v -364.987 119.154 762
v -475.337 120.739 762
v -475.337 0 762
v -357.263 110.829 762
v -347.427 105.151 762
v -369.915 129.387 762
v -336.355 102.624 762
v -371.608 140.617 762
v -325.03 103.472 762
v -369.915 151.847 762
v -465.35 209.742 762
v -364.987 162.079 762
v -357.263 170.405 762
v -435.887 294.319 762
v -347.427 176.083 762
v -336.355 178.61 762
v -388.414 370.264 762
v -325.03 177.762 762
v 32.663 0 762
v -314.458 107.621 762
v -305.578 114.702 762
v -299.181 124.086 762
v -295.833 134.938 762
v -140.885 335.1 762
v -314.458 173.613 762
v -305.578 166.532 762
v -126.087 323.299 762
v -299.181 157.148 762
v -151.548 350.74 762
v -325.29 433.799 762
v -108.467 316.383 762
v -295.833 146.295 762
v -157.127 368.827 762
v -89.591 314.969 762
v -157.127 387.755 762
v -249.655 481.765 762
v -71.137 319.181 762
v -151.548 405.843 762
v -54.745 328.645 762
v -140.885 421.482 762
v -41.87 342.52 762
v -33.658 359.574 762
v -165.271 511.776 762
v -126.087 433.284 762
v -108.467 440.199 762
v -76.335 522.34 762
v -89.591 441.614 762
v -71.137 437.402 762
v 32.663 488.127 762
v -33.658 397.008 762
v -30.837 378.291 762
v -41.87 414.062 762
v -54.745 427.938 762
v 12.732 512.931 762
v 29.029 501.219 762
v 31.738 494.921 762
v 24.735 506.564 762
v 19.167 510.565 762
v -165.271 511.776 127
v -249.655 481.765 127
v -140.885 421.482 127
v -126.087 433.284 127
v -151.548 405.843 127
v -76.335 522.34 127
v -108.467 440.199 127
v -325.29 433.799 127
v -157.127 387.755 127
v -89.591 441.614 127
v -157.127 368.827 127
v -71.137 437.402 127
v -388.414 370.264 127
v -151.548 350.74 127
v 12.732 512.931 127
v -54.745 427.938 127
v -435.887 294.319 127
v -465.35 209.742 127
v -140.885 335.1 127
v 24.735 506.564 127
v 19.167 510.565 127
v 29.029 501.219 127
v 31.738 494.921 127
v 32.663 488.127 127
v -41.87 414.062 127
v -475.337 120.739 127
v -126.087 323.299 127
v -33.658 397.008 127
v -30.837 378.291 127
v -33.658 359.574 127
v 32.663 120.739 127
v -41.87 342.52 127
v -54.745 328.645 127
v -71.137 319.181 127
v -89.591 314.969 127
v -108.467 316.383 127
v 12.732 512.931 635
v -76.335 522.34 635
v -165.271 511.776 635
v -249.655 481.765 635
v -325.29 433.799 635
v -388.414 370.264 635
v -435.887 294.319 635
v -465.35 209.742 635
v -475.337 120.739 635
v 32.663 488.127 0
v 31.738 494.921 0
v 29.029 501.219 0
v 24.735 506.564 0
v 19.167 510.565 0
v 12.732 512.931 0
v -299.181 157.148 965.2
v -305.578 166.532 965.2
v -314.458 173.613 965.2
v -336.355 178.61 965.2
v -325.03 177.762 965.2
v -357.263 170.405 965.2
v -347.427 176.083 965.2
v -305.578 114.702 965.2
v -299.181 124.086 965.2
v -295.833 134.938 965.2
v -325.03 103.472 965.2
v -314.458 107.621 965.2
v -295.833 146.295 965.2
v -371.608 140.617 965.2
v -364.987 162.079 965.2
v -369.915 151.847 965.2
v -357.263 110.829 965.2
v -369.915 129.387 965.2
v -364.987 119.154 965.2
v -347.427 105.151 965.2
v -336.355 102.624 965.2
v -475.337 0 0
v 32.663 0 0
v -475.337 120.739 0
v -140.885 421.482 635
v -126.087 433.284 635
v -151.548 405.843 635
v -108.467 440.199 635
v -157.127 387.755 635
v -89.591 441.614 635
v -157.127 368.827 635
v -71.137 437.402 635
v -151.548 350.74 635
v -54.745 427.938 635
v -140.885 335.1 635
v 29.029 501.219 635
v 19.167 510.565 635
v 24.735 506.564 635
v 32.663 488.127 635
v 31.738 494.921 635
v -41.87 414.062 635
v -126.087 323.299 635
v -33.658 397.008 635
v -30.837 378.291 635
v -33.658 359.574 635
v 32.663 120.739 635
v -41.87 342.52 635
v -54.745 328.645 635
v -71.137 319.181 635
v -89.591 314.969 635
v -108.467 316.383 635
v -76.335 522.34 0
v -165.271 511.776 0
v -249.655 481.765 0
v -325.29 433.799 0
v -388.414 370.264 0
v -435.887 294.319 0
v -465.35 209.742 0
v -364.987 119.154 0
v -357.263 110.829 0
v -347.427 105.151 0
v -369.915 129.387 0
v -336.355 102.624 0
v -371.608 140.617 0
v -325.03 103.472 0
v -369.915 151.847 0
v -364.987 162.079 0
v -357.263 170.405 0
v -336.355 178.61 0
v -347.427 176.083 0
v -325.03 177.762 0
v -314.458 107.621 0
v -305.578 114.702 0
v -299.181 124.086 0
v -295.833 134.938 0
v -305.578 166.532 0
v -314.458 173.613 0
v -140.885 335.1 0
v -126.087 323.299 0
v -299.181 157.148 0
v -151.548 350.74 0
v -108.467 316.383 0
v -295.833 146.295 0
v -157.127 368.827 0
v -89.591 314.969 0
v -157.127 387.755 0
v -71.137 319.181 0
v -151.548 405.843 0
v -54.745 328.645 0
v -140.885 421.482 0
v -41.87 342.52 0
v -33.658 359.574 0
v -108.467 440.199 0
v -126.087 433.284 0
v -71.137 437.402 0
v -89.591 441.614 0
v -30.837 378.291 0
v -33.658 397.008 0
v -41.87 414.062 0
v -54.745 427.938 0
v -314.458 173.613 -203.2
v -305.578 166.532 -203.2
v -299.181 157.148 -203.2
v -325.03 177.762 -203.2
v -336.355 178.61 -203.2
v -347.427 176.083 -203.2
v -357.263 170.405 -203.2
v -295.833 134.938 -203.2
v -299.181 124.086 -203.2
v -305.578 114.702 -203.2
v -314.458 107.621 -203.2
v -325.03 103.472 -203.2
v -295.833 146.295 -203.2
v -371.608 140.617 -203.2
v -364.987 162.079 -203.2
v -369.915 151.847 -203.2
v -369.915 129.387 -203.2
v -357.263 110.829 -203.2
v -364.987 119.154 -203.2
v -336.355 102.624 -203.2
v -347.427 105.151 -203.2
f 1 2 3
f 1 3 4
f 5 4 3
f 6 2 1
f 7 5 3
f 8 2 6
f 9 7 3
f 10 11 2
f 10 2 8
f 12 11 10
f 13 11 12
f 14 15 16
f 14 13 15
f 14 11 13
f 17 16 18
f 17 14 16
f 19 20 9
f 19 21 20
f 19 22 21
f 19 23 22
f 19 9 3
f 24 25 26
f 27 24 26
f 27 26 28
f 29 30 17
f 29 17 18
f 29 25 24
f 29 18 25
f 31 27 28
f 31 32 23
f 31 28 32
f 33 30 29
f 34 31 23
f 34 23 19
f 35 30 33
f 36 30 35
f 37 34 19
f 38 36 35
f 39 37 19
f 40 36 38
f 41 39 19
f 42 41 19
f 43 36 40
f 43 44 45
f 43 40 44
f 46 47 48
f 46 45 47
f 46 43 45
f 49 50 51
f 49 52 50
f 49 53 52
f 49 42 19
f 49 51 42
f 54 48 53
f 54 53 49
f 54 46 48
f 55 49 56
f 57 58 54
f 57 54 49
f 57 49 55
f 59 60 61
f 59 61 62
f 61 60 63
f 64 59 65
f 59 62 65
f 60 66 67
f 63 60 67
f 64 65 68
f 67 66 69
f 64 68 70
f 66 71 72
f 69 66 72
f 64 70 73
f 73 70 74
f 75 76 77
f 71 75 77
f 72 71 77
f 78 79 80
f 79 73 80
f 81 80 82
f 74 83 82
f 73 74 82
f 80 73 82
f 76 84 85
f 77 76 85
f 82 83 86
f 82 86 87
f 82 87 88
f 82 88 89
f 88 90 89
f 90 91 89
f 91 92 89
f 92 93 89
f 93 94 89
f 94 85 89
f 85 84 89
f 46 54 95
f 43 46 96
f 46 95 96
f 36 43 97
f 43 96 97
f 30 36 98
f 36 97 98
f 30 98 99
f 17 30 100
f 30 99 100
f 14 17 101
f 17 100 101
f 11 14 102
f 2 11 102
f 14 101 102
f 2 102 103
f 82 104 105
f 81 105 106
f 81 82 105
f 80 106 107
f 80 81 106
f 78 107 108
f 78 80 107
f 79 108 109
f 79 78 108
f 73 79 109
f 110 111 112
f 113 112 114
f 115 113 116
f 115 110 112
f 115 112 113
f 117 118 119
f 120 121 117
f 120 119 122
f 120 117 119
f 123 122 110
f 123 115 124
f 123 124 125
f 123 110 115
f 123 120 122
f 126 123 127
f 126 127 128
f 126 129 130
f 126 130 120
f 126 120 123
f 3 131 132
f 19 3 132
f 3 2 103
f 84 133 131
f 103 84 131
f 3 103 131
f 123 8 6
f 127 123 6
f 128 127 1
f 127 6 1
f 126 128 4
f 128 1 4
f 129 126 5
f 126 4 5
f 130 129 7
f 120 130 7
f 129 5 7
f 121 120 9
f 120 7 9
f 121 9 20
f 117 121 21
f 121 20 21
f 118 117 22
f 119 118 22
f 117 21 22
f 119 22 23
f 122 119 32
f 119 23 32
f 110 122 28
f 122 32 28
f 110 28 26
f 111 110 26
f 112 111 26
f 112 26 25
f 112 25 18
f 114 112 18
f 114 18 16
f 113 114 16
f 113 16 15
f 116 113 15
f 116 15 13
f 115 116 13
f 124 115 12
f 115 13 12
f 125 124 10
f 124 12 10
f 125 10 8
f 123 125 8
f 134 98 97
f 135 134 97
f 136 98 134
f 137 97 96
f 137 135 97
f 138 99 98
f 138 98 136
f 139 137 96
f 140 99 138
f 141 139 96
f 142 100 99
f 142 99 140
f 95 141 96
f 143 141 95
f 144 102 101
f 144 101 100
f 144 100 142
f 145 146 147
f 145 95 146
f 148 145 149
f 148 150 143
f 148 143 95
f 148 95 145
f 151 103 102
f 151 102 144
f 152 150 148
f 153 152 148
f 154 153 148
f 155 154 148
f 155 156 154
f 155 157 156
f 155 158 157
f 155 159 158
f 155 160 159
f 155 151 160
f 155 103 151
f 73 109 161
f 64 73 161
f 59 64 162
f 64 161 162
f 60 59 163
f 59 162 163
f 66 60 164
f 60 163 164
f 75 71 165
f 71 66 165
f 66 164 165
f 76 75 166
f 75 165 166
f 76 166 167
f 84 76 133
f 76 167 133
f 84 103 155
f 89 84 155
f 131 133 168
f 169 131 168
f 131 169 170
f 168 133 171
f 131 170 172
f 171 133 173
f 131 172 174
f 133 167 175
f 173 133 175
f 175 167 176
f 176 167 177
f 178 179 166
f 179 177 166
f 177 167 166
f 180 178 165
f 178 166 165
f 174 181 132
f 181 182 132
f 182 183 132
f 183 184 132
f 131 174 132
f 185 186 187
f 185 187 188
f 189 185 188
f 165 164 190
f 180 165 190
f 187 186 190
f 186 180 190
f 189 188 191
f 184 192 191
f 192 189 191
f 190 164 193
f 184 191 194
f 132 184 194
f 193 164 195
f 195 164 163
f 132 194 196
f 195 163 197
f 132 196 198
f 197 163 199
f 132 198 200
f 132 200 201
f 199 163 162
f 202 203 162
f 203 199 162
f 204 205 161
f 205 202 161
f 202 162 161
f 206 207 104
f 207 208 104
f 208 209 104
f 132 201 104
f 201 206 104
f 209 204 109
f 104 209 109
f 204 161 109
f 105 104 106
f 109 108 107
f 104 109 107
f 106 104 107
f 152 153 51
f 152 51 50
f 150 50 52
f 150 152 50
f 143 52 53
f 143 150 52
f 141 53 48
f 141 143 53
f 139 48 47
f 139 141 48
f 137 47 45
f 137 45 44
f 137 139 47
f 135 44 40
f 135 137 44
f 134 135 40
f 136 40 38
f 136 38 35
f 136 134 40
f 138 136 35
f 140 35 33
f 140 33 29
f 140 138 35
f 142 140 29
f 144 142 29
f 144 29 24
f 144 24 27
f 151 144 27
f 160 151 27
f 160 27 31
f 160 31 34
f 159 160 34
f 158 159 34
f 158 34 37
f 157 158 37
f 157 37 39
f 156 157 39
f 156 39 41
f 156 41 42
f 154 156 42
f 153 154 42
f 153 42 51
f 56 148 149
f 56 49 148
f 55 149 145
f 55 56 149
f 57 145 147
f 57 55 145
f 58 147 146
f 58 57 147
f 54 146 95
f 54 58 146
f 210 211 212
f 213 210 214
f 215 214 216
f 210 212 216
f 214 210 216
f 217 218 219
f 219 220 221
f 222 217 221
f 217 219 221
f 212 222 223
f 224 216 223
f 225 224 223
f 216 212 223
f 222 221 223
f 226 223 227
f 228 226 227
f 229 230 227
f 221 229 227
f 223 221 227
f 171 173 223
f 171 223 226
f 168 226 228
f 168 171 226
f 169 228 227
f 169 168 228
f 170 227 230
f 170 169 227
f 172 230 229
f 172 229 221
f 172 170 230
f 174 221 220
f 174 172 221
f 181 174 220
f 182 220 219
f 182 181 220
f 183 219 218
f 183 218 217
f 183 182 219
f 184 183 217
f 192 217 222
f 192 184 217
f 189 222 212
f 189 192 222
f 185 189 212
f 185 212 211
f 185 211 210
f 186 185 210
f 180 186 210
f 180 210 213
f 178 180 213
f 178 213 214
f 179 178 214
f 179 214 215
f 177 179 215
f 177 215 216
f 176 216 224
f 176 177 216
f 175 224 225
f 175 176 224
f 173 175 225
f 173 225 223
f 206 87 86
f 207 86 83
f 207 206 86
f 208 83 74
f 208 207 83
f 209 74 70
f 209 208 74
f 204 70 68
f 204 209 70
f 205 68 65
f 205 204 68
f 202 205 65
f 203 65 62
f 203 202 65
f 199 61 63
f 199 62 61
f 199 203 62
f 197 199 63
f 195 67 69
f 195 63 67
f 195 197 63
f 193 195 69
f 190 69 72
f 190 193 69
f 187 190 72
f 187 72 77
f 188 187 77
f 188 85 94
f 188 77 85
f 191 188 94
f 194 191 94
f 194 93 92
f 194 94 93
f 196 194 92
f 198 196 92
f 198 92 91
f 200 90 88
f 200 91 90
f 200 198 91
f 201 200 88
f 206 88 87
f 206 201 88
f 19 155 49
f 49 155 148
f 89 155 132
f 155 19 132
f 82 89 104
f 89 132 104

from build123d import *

# Parameters (mm, degrees)
SKETCH1_R               = 63.5
BOSS_EXTRUDE1_DEPTH     = 762
CUT_EXTRUDE1_DEPTH      = 1032.82015403
CUT_EXTRUDE1_DEPTH_BACK = 387.260908
SKETCH2_W               = 765.404618736
SKETCH2_H               = 508
SKETCH3_R               = 38.1
BOSS_EXTRUDE2_DEPTH     = 203.2
FILLET1_R               = 25.4


with BuildPart() as part:
    # Sketch1 → Boss-Extrude1 (new body)
    with BuildSketch(Plane.XY):
        with BuildLine():
            Line((-475.33654421, 0), (32.66345579, 0))
            Line((32.66345579, 0), (32.66345579, 508))
            ThreePointArc((32.66345579, 508), (-317.204687381, 440.127182905), (-475.33654421, 120.739091765))
            Line((-475.33654421, 120.739091765), (-475.33654421, 0))
        make_face()
        with Locations((-94.33654421, 378.291313639)):
            Circle(SKETCH1_R, mode=Mode.SUBTRACT)
    extrude(amount=BOSS_EXTRUDE1_DEPTH)

    # Sketch2 → Cut-Extrude1 (cut, two sides: drawn at the far end of the back side and taken through both)
    with BuildSketch(Plane(origin=(0, 508, 0), x_dir=(1, 0, 0), z_dir=(0, 1, 0)).offset(-CUT_EXTRUDE1_DEPTH_BACK)):
        with Locations((-173.345287356, -381)):
            Rectangle(SKETCH2_W, SKETCH2_H)
    extrude(amount=CUT_EXTRUDE1_DEPTH + CUT_EXTRUDE1_DEPTH_BACK, mode=Mode.SUBTRACT)

    # Sketch3 → Boss-Extrude2 (add)
    with BuildSketch(Plane.XY.offset(762)):
        with Locations(Location((-333.507660116, 140.616973841, 0), (0, 0, 180))):
            Circle(SKETCH3_R)
    boss_extrude2 = extrude(amount=BOSS_EXTRUDE2_DEPTH)

    # Mirror1: Boss-Extrude2 across plane
    add(boss_extrude2.mirror(Plane.XY.offset(381)))

    # Fillet1
    fillet1_edges = [part.edges().sort_by_distance(p)[0] for p in [
        (32.66345579, 508, 63.5),
        (32.66345579, 508, 698.5),
    ]]
    fillet(fillet1_edges, radius=FILLET1_R)


solid = part.part
